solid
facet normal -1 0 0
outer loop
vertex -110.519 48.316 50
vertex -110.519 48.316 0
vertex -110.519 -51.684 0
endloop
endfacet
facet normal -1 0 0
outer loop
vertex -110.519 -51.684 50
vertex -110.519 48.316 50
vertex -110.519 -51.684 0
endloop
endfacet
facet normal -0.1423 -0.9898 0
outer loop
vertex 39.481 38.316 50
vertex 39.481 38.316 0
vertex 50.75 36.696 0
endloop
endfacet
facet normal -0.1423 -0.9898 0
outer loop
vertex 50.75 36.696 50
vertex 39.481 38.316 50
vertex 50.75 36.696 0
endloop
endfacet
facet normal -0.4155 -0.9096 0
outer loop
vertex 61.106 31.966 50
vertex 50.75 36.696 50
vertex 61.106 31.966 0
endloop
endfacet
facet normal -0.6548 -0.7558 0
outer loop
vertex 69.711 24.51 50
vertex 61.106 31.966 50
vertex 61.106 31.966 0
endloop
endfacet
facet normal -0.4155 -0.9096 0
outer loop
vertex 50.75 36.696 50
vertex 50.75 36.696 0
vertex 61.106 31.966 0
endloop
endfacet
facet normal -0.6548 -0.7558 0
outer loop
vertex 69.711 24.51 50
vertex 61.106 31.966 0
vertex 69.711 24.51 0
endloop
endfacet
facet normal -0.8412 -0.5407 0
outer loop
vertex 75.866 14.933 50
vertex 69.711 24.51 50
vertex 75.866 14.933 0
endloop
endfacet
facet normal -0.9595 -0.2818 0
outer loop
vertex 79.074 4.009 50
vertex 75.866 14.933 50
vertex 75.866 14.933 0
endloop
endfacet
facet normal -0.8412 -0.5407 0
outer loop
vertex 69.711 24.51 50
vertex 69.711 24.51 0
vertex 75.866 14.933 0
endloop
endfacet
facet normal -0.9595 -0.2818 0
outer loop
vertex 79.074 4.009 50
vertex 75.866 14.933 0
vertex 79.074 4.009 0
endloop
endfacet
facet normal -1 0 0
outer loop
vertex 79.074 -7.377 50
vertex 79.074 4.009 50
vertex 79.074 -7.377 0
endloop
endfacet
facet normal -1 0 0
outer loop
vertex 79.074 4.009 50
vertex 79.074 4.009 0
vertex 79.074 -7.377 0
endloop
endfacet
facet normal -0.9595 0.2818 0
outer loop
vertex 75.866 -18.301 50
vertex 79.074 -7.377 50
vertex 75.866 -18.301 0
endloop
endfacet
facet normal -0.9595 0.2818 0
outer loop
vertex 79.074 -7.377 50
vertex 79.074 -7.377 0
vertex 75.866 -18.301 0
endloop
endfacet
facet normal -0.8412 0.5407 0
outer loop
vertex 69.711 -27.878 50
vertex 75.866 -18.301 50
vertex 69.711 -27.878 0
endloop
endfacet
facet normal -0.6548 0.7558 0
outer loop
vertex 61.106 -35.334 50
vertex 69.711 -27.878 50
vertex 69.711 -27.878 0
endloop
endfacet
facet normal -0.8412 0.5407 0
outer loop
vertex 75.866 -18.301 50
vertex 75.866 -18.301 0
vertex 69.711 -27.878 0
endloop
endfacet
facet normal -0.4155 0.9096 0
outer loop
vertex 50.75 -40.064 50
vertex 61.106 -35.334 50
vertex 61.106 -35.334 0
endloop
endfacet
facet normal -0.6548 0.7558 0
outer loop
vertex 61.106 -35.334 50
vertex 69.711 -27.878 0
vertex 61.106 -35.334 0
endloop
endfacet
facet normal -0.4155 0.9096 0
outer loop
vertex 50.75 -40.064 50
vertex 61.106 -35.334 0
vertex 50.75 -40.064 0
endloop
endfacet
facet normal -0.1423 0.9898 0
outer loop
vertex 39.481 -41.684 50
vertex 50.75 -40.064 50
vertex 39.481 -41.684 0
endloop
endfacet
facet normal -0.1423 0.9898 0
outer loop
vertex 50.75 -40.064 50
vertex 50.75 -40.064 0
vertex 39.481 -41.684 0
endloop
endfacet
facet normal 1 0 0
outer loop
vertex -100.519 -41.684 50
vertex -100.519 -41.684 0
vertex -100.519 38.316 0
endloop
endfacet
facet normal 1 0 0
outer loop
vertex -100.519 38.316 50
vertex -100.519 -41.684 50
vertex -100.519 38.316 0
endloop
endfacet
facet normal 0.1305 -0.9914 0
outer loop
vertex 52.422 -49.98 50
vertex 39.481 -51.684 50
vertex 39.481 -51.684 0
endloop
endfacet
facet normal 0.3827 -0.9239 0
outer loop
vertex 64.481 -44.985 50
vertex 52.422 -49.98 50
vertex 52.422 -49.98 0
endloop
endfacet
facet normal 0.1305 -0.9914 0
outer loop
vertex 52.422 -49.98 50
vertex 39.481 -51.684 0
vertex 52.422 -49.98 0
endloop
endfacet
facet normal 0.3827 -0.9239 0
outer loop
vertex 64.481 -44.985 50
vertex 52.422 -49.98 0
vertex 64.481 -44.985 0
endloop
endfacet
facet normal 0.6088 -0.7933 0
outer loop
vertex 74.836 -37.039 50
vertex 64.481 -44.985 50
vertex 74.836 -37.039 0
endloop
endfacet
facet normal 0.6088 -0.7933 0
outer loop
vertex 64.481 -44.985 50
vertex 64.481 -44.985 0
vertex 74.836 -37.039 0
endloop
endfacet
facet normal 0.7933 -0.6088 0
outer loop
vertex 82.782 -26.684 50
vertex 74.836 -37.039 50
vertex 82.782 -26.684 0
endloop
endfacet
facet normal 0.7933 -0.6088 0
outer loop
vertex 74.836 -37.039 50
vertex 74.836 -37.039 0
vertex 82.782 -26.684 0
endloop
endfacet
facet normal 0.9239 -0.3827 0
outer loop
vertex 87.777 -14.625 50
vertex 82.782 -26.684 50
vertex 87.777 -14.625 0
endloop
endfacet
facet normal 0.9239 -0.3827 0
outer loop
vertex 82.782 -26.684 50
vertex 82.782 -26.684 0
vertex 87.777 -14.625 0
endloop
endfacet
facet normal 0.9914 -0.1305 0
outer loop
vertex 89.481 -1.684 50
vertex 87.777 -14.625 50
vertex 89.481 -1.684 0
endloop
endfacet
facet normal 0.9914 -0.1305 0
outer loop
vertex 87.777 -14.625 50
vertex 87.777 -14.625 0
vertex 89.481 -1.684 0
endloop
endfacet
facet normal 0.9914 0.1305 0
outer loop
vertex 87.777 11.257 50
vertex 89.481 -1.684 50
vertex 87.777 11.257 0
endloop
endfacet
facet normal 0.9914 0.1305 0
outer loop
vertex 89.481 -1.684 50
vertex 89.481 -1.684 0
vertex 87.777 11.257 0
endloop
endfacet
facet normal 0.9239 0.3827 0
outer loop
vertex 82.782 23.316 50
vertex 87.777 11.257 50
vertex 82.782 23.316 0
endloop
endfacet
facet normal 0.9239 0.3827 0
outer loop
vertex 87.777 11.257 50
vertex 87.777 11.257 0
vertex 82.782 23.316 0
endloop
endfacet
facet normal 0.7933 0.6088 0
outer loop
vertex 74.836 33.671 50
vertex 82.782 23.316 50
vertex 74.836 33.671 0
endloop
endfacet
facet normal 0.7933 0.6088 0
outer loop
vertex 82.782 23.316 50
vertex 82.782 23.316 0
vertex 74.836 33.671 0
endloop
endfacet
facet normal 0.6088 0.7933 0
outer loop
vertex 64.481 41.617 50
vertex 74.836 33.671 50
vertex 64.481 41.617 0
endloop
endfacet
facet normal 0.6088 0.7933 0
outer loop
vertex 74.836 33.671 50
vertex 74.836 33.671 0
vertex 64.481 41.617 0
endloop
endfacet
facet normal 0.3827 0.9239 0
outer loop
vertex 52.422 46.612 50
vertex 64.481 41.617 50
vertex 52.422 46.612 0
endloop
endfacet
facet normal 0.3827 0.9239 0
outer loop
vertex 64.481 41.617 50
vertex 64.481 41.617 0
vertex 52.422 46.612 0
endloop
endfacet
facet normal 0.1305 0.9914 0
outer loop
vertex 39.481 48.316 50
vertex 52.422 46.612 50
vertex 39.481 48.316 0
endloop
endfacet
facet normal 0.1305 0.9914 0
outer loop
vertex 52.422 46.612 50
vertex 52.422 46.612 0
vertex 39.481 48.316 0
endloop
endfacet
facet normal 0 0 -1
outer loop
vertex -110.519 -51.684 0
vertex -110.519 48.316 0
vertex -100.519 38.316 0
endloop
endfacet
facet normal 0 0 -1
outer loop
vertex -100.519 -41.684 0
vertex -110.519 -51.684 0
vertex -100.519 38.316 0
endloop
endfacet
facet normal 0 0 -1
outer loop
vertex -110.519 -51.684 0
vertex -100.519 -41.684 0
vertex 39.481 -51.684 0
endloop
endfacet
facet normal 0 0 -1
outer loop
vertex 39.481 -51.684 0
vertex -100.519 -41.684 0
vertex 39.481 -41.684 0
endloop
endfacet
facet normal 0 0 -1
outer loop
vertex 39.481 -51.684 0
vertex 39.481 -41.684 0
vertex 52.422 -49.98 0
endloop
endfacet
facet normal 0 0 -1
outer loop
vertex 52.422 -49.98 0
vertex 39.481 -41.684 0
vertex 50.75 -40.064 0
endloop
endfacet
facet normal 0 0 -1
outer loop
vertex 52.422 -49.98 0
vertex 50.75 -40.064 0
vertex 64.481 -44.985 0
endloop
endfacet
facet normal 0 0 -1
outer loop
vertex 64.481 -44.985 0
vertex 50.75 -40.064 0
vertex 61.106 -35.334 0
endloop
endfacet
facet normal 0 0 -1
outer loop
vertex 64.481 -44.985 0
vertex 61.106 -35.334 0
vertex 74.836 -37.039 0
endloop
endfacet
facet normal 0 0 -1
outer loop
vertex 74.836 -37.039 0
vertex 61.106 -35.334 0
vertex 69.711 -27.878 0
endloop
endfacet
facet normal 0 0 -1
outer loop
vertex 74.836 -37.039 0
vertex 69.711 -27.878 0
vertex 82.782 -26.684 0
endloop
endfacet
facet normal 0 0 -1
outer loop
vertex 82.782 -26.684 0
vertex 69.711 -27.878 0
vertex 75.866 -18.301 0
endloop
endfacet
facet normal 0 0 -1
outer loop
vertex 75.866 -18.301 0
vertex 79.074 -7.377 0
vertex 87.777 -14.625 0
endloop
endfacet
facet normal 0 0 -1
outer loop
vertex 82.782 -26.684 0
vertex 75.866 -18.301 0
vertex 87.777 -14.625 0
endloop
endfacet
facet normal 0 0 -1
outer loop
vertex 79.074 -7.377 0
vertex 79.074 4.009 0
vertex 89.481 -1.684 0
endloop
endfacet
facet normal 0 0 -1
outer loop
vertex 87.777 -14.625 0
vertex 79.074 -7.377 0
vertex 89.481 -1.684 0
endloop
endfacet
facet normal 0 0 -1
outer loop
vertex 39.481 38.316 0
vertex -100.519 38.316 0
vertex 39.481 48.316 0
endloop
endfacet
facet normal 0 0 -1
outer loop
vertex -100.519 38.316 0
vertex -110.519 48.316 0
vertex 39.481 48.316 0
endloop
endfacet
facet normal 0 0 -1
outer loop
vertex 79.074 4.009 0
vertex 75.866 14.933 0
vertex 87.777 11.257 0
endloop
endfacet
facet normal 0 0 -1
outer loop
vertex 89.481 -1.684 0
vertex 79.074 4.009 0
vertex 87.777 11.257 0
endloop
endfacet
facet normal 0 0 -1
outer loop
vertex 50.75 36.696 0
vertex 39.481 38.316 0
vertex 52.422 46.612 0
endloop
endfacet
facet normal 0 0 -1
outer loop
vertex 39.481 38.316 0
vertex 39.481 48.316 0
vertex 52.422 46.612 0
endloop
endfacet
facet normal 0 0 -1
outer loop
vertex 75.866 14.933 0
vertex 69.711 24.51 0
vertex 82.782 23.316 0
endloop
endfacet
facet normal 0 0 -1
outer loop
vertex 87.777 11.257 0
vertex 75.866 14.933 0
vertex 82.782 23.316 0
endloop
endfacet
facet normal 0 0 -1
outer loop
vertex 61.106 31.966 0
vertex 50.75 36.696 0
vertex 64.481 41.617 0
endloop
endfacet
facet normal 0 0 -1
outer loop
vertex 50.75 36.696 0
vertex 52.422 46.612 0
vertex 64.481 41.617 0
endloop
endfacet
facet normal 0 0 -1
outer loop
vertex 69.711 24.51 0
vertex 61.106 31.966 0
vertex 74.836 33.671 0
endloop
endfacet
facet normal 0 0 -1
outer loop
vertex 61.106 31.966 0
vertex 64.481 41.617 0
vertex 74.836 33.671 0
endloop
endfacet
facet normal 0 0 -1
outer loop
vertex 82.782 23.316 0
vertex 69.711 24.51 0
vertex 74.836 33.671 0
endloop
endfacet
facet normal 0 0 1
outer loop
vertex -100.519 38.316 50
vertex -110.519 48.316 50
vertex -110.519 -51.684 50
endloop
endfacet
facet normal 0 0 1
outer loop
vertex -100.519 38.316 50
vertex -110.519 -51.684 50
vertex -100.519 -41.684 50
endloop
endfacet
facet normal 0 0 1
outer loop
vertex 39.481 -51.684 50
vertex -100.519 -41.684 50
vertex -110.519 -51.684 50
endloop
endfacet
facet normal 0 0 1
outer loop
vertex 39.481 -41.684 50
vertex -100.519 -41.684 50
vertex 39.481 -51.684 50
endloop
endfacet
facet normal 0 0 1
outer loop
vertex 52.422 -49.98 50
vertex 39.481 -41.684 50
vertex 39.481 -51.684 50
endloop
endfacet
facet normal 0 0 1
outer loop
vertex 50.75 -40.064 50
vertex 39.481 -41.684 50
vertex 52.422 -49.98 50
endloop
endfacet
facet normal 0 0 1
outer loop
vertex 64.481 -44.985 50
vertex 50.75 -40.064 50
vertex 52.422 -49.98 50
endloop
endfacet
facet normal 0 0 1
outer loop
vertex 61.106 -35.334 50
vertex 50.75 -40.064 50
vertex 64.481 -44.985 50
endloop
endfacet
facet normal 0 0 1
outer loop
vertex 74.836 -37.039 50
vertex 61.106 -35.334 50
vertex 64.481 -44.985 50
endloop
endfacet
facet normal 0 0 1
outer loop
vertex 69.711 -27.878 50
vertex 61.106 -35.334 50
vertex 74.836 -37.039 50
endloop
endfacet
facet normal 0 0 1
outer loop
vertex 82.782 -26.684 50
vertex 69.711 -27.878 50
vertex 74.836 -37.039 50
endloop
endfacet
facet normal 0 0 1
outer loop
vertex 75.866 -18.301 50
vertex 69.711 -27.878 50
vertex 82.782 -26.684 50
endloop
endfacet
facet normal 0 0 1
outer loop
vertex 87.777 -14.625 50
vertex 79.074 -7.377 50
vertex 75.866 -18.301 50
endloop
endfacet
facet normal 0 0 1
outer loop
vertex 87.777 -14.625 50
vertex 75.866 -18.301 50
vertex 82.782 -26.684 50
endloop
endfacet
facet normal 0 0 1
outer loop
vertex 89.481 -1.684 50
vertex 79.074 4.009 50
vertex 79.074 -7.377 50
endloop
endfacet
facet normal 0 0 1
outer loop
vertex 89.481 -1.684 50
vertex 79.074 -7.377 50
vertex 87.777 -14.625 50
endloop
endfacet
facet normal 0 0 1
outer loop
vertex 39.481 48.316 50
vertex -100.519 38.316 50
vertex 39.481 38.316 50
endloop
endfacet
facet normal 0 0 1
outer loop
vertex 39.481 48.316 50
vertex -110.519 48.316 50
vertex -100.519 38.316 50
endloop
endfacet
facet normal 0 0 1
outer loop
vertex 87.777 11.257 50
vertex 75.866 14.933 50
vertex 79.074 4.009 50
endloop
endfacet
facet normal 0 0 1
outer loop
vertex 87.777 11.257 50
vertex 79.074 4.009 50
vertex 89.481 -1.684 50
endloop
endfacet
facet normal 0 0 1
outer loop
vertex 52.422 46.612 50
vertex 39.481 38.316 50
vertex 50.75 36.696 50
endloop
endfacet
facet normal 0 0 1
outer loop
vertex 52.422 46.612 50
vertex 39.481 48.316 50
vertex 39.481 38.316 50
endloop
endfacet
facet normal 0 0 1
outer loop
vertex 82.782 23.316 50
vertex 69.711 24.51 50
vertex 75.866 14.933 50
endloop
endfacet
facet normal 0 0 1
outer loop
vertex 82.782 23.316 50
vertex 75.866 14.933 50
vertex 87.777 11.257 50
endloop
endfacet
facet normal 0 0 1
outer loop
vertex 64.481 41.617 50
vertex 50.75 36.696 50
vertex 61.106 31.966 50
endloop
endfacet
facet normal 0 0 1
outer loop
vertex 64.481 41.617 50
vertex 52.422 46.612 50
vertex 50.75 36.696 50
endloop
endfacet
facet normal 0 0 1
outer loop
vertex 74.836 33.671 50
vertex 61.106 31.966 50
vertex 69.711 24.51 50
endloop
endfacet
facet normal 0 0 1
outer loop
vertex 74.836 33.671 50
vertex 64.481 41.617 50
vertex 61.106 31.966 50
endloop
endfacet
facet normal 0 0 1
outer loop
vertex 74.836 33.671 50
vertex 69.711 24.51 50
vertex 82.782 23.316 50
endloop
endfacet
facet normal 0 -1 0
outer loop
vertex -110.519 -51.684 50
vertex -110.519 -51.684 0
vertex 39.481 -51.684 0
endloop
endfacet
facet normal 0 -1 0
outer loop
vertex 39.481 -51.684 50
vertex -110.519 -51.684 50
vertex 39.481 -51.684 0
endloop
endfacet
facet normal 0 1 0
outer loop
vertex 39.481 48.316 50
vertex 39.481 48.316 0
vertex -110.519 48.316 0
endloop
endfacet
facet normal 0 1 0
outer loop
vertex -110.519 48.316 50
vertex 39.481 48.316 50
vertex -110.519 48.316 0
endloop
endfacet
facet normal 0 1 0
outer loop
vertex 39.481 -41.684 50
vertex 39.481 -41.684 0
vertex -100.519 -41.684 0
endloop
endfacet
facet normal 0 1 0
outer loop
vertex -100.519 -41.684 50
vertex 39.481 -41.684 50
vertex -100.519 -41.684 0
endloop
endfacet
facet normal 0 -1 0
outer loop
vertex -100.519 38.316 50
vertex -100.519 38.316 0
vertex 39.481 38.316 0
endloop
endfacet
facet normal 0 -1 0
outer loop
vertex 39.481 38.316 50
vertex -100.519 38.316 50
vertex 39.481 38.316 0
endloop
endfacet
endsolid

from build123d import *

# Parameters (mm, degrees)
F1_DEPTH = 50


with BuildPart() as f1:
    # F0 (on Top) → F1 (new body)
    with BuildSketch(Plane.XY):
        Polygon((39.4807644188, 48.3160374686), (-110.5192355812, 48.3160374686), (-110.5192355812, -51.6839625314), (39.4807644188, -51.6839625314), (39.4807644188, -41.6839625314), (-100.5192355812, -41.6839625314), (-100.5192355812, 38.3160374686), (39.4807644188, 38.3160374686), align=None)
        with BuildLine():
            ThreePointArc((39.4807644188, -51.6839625314), (89.4807644188, -1.6839625314), (39.4807644188, 48.3160374686))
            Line((39.4807644188, 48.3160374686), (39.4807644188, 38.3160374686))
            ThreePointArc((39.4807644188, 38.3160374686), (79.4807644188, -1.6839625314), (39.4807644188, -41.6839625314))
            Line((39.4807644188, -41.6839625314), (39.4807644188, -51.6839625314))
        make_face()
    extrude(amount=F1_DEPTH)


solid = f1.part
